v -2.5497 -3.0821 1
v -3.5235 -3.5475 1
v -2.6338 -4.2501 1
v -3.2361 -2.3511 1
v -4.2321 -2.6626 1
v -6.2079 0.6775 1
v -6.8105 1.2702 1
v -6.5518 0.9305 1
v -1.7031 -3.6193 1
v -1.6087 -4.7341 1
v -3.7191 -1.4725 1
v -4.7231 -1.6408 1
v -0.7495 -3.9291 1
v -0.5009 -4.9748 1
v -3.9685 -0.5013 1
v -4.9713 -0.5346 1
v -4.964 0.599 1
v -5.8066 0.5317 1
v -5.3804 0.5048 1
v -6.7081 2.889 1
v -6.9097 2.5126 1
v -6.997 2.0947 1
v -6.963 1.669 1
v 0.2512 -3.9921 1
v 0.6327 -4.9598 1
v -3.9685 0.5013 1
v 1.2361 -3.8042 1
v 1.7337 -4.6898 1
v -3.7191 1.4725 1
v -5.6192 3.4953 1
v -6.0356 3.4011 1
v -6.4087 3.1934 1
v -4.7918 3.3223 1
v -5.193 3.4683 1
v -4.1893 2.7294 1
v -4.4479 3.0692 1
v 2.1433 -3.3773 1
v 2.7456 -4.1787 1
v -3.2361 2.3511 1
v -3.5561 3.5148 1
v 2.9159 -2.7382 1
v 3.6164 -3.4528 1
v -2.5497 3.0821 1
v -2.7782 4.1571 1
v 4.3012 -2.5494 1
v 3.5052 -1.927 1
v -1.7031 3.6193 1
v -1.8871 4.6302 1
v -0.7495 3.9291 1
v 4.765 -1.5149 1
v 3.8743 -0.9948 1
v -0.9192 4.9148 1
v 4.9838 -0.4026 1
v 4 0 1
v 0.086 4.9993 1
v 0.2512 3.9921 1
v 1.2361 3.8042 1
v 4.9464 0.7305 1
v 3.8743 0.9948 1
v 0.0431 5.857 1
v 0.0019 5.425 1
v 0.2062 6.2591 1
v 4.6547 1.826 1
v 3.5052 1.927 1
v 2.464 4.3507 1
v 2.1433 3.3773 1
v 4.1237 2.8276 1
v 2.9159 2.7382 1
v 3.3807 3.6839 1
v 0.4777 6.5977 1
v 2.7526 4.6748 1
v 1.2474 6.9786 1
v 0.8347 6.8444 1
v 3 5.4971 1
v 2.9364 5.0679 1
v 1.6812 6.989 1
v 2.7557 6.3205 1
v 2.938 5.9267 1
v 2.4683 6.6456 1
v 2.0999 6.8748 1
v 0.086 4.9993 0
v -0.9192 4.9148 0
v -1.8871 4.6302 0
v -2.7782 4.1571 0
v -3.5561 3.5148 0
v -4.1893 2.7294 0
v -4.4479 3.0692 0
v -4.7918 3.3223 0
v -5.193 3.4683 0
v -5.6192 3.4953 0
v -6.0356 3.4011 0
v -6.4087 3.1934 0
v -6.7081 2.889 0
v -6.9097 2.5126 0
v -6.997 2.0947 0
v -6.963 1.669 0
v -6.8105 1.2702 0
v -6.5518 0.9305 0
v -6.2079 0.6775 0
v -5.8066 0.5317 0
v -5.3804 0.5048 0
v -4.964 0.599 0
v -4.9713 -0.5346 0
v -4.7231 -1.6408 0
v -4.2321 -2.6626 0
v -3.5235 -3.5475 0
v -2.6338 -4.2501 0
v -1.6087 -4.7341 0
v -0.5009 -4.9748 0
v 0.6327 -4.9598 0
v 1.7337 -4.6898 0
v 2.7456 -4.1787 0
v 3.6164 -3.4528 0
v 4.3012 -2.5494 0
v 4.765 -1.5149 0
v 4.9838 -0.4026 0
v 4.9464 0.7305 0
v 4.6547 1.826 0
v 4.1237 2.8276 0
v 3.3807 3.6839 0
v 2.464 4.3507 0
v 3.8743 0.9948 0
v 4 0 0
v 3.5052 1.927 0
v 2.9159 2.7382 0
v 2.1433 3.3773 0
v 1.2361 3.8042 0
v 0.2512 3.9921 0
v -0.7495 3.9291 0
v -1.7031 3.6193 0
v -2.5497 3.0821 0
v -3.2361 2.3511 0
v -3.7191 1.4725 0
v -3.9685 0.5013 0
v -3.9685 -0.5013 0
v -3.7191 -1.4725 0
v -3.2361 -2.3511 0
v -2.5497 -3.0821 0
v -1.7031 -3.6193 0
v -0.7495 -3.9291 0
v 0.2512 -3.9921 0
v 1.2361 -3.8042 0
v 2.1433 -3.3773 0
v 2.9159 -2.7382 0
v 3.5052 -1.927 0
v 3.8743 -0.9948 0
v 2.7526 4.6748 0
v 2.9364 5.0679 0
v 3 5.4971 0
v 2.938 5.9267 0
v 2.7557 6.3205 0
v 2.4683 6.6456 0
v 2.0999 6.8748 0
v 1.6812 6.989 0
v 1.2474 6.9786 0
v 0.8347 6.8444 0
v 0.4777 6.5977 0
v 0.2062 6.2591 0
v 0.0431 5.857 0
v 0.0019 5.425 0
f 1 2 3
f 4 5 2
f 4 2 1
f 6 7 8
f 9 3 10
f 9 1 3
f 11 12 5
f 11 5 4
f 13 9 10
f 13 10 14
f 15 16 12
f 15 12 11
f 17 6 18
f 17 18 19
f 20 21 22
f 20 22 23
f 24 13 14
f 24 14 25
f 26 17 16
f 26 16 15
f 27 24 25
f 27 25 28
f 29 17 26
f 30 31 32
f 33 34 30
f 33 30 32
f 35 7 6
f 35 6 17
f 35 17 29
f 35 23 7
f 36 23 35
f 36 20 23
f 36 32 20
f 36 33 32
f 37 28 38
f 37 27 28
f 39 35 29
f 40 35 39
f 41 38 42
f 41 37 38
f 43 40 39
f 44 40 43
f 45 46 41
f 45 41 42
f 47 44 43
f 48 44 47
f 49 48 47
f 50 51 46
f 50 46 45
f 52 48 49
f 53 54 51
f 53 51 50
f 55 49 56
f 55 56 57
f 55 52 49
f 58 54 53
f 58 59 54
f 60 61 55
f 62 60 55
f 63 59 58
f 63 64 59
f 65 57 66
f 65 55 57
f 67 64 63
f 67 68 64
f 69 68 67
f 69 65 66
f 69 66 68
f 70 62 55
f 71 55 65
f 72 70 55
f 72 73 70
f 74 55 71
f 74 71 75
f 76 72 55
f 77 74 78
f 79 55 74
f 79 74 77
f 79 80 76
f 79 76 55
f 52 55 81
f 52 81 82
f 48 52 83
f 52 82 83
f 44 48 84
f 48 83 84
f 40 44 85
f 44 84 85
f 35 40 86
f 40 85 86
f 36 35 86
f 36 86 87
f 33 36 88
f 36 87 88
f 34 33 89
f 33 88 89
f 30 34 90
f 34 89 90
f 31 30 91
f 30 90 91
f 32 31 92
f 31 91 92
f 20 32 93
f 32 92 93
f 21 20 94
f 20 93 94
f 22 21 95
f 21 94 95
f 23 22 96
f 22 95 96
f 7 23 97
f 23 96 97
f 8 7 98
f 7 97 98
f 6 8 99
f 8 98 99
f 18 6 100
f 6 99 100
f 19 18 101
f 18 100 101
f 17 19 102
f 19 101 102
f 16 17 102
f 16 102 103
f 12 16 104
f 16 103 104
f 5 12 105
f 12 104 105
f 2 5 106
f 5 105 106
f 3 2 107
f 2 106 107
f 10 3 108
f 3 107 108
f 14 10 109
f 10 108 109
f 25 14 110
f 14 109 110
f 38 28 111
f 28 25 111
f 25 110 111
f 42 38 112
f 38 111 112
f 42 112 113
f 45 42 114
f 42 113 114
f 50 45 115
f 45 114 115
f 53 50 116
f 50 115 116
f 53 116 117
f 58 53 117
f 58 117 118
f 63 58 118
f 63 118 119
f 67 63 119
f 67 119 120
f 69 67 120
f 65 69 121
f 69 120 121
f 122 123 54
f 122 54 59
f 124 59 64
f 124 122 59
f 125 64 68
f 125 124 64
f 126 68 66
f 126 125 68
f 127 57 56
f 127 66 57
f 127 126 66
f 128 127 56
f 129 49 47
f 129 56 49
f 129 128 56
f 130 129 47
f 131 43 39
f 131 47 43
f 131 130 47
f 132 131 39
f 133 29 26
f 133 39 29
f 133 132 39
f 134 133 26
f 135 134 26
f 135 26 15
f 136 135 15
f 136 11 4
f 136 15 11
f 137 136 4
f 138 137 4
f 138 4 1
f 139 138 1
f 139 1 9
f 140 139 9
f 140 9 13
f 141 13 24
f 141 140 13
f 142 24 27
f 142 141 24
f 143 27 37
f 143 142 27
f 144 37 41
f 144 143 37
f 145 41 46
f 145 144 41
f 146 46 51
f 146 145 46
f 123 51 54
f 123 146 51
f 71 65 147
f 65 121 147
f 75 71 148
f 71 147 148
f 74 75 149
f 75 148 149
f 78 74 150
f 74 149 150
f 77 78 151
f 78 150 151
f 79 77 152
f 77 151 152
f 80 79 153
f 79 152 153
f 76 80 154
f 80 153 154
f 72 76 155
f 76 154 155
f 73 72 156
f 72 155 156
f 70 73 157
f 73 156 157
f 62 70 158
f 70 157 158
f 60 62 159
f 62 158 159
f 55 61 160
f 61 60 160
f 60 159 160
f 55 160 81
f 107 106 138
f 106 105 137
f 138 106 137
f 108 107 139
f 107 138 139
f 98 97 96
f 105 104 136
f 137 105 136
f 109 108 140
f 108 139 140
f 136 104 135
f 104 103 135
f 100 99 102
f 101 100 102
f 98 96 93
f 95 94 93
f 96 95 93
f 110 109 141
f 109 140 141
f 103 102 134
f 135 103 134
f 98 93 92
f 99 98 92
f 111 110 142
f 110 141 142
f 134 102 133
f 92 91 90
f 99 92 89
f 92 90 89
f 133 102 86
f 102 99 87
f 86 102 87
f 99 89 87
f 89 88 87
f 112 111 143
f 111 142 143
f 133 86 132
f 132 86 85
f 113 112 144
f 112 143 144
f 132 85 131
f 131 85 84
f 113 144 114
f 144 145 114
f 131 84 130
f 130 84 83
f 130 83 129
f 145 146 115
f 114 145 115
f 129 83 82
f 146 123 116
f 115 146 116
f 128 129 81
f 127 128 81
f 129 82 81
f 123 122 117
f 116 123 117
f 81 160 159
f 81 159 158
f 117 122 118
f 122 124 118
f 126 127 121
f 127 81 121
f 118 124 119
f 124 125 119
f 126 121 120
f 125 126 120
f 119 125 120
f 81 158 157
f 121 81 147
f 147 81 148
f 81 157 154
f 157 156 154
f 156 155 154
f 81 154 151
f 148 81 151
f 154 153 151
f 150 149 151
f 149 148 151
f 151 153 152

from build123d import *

# Parameters (mm, degrees)
CYLINDER003_R     = 1.5
CYLINDER003_DEPTH = 1
CYLINDER001_R     = 4
CYLINDER001_DEPTH = 10
CYLINDER_R        = 5
CYLINDER_DEPTH    = 1
CYLINDER002_R     = 1.5
CYLINDER002_DEPTH = 1


with BuildPart() as cylinder003:
    # Cylinder003 → Cylinder003 (new body)
    with BuildSketch(Plane(origin=(1.5, 5.5, 0), x_dir=(1, 0, 0), z_dir=(0, 0, 1))):
        Circle(CYLINDER003_R)
    extrude(amount=CYLINDER003_DEPTH)


with BuildPart() as cylinder001:
    # Cylinder001 → Cylinder001 (new body)
    with BuildSketch(Plane.XY.offset(-5)):
        Circle(CYLINDER001_R)
    extrude(amount=CYLINDER001_DEPTH)


with BuildPart() as cut:
    # Cylinder → Cylinder (new body)
    with BuildSketch(Plane.XY):
        Circle(CYLINDER_R)
    extrude(amount=CYLINDER_DEPTH)

    # Cut: cut Cylinder001
    add(cylinder001.part, mode=Mode.SUBTRACT)


with BuildPart() as fusion:
    # Cylinder002 → Cylinder002 (new body)
    with BuildSketch(Plane(origin=(-5.5, 2, 0), x_dir=(1, 0, 0), z_dir=(0, 0, 1))):
        Circle(CYLINDER002_R)
    extrude(amount=CYLINDER002_DEPTH)

    # Fusion: union Cylinder003, Cut
    add(cylinder003.part)
    add(cut.part)


solid = fusion.part
